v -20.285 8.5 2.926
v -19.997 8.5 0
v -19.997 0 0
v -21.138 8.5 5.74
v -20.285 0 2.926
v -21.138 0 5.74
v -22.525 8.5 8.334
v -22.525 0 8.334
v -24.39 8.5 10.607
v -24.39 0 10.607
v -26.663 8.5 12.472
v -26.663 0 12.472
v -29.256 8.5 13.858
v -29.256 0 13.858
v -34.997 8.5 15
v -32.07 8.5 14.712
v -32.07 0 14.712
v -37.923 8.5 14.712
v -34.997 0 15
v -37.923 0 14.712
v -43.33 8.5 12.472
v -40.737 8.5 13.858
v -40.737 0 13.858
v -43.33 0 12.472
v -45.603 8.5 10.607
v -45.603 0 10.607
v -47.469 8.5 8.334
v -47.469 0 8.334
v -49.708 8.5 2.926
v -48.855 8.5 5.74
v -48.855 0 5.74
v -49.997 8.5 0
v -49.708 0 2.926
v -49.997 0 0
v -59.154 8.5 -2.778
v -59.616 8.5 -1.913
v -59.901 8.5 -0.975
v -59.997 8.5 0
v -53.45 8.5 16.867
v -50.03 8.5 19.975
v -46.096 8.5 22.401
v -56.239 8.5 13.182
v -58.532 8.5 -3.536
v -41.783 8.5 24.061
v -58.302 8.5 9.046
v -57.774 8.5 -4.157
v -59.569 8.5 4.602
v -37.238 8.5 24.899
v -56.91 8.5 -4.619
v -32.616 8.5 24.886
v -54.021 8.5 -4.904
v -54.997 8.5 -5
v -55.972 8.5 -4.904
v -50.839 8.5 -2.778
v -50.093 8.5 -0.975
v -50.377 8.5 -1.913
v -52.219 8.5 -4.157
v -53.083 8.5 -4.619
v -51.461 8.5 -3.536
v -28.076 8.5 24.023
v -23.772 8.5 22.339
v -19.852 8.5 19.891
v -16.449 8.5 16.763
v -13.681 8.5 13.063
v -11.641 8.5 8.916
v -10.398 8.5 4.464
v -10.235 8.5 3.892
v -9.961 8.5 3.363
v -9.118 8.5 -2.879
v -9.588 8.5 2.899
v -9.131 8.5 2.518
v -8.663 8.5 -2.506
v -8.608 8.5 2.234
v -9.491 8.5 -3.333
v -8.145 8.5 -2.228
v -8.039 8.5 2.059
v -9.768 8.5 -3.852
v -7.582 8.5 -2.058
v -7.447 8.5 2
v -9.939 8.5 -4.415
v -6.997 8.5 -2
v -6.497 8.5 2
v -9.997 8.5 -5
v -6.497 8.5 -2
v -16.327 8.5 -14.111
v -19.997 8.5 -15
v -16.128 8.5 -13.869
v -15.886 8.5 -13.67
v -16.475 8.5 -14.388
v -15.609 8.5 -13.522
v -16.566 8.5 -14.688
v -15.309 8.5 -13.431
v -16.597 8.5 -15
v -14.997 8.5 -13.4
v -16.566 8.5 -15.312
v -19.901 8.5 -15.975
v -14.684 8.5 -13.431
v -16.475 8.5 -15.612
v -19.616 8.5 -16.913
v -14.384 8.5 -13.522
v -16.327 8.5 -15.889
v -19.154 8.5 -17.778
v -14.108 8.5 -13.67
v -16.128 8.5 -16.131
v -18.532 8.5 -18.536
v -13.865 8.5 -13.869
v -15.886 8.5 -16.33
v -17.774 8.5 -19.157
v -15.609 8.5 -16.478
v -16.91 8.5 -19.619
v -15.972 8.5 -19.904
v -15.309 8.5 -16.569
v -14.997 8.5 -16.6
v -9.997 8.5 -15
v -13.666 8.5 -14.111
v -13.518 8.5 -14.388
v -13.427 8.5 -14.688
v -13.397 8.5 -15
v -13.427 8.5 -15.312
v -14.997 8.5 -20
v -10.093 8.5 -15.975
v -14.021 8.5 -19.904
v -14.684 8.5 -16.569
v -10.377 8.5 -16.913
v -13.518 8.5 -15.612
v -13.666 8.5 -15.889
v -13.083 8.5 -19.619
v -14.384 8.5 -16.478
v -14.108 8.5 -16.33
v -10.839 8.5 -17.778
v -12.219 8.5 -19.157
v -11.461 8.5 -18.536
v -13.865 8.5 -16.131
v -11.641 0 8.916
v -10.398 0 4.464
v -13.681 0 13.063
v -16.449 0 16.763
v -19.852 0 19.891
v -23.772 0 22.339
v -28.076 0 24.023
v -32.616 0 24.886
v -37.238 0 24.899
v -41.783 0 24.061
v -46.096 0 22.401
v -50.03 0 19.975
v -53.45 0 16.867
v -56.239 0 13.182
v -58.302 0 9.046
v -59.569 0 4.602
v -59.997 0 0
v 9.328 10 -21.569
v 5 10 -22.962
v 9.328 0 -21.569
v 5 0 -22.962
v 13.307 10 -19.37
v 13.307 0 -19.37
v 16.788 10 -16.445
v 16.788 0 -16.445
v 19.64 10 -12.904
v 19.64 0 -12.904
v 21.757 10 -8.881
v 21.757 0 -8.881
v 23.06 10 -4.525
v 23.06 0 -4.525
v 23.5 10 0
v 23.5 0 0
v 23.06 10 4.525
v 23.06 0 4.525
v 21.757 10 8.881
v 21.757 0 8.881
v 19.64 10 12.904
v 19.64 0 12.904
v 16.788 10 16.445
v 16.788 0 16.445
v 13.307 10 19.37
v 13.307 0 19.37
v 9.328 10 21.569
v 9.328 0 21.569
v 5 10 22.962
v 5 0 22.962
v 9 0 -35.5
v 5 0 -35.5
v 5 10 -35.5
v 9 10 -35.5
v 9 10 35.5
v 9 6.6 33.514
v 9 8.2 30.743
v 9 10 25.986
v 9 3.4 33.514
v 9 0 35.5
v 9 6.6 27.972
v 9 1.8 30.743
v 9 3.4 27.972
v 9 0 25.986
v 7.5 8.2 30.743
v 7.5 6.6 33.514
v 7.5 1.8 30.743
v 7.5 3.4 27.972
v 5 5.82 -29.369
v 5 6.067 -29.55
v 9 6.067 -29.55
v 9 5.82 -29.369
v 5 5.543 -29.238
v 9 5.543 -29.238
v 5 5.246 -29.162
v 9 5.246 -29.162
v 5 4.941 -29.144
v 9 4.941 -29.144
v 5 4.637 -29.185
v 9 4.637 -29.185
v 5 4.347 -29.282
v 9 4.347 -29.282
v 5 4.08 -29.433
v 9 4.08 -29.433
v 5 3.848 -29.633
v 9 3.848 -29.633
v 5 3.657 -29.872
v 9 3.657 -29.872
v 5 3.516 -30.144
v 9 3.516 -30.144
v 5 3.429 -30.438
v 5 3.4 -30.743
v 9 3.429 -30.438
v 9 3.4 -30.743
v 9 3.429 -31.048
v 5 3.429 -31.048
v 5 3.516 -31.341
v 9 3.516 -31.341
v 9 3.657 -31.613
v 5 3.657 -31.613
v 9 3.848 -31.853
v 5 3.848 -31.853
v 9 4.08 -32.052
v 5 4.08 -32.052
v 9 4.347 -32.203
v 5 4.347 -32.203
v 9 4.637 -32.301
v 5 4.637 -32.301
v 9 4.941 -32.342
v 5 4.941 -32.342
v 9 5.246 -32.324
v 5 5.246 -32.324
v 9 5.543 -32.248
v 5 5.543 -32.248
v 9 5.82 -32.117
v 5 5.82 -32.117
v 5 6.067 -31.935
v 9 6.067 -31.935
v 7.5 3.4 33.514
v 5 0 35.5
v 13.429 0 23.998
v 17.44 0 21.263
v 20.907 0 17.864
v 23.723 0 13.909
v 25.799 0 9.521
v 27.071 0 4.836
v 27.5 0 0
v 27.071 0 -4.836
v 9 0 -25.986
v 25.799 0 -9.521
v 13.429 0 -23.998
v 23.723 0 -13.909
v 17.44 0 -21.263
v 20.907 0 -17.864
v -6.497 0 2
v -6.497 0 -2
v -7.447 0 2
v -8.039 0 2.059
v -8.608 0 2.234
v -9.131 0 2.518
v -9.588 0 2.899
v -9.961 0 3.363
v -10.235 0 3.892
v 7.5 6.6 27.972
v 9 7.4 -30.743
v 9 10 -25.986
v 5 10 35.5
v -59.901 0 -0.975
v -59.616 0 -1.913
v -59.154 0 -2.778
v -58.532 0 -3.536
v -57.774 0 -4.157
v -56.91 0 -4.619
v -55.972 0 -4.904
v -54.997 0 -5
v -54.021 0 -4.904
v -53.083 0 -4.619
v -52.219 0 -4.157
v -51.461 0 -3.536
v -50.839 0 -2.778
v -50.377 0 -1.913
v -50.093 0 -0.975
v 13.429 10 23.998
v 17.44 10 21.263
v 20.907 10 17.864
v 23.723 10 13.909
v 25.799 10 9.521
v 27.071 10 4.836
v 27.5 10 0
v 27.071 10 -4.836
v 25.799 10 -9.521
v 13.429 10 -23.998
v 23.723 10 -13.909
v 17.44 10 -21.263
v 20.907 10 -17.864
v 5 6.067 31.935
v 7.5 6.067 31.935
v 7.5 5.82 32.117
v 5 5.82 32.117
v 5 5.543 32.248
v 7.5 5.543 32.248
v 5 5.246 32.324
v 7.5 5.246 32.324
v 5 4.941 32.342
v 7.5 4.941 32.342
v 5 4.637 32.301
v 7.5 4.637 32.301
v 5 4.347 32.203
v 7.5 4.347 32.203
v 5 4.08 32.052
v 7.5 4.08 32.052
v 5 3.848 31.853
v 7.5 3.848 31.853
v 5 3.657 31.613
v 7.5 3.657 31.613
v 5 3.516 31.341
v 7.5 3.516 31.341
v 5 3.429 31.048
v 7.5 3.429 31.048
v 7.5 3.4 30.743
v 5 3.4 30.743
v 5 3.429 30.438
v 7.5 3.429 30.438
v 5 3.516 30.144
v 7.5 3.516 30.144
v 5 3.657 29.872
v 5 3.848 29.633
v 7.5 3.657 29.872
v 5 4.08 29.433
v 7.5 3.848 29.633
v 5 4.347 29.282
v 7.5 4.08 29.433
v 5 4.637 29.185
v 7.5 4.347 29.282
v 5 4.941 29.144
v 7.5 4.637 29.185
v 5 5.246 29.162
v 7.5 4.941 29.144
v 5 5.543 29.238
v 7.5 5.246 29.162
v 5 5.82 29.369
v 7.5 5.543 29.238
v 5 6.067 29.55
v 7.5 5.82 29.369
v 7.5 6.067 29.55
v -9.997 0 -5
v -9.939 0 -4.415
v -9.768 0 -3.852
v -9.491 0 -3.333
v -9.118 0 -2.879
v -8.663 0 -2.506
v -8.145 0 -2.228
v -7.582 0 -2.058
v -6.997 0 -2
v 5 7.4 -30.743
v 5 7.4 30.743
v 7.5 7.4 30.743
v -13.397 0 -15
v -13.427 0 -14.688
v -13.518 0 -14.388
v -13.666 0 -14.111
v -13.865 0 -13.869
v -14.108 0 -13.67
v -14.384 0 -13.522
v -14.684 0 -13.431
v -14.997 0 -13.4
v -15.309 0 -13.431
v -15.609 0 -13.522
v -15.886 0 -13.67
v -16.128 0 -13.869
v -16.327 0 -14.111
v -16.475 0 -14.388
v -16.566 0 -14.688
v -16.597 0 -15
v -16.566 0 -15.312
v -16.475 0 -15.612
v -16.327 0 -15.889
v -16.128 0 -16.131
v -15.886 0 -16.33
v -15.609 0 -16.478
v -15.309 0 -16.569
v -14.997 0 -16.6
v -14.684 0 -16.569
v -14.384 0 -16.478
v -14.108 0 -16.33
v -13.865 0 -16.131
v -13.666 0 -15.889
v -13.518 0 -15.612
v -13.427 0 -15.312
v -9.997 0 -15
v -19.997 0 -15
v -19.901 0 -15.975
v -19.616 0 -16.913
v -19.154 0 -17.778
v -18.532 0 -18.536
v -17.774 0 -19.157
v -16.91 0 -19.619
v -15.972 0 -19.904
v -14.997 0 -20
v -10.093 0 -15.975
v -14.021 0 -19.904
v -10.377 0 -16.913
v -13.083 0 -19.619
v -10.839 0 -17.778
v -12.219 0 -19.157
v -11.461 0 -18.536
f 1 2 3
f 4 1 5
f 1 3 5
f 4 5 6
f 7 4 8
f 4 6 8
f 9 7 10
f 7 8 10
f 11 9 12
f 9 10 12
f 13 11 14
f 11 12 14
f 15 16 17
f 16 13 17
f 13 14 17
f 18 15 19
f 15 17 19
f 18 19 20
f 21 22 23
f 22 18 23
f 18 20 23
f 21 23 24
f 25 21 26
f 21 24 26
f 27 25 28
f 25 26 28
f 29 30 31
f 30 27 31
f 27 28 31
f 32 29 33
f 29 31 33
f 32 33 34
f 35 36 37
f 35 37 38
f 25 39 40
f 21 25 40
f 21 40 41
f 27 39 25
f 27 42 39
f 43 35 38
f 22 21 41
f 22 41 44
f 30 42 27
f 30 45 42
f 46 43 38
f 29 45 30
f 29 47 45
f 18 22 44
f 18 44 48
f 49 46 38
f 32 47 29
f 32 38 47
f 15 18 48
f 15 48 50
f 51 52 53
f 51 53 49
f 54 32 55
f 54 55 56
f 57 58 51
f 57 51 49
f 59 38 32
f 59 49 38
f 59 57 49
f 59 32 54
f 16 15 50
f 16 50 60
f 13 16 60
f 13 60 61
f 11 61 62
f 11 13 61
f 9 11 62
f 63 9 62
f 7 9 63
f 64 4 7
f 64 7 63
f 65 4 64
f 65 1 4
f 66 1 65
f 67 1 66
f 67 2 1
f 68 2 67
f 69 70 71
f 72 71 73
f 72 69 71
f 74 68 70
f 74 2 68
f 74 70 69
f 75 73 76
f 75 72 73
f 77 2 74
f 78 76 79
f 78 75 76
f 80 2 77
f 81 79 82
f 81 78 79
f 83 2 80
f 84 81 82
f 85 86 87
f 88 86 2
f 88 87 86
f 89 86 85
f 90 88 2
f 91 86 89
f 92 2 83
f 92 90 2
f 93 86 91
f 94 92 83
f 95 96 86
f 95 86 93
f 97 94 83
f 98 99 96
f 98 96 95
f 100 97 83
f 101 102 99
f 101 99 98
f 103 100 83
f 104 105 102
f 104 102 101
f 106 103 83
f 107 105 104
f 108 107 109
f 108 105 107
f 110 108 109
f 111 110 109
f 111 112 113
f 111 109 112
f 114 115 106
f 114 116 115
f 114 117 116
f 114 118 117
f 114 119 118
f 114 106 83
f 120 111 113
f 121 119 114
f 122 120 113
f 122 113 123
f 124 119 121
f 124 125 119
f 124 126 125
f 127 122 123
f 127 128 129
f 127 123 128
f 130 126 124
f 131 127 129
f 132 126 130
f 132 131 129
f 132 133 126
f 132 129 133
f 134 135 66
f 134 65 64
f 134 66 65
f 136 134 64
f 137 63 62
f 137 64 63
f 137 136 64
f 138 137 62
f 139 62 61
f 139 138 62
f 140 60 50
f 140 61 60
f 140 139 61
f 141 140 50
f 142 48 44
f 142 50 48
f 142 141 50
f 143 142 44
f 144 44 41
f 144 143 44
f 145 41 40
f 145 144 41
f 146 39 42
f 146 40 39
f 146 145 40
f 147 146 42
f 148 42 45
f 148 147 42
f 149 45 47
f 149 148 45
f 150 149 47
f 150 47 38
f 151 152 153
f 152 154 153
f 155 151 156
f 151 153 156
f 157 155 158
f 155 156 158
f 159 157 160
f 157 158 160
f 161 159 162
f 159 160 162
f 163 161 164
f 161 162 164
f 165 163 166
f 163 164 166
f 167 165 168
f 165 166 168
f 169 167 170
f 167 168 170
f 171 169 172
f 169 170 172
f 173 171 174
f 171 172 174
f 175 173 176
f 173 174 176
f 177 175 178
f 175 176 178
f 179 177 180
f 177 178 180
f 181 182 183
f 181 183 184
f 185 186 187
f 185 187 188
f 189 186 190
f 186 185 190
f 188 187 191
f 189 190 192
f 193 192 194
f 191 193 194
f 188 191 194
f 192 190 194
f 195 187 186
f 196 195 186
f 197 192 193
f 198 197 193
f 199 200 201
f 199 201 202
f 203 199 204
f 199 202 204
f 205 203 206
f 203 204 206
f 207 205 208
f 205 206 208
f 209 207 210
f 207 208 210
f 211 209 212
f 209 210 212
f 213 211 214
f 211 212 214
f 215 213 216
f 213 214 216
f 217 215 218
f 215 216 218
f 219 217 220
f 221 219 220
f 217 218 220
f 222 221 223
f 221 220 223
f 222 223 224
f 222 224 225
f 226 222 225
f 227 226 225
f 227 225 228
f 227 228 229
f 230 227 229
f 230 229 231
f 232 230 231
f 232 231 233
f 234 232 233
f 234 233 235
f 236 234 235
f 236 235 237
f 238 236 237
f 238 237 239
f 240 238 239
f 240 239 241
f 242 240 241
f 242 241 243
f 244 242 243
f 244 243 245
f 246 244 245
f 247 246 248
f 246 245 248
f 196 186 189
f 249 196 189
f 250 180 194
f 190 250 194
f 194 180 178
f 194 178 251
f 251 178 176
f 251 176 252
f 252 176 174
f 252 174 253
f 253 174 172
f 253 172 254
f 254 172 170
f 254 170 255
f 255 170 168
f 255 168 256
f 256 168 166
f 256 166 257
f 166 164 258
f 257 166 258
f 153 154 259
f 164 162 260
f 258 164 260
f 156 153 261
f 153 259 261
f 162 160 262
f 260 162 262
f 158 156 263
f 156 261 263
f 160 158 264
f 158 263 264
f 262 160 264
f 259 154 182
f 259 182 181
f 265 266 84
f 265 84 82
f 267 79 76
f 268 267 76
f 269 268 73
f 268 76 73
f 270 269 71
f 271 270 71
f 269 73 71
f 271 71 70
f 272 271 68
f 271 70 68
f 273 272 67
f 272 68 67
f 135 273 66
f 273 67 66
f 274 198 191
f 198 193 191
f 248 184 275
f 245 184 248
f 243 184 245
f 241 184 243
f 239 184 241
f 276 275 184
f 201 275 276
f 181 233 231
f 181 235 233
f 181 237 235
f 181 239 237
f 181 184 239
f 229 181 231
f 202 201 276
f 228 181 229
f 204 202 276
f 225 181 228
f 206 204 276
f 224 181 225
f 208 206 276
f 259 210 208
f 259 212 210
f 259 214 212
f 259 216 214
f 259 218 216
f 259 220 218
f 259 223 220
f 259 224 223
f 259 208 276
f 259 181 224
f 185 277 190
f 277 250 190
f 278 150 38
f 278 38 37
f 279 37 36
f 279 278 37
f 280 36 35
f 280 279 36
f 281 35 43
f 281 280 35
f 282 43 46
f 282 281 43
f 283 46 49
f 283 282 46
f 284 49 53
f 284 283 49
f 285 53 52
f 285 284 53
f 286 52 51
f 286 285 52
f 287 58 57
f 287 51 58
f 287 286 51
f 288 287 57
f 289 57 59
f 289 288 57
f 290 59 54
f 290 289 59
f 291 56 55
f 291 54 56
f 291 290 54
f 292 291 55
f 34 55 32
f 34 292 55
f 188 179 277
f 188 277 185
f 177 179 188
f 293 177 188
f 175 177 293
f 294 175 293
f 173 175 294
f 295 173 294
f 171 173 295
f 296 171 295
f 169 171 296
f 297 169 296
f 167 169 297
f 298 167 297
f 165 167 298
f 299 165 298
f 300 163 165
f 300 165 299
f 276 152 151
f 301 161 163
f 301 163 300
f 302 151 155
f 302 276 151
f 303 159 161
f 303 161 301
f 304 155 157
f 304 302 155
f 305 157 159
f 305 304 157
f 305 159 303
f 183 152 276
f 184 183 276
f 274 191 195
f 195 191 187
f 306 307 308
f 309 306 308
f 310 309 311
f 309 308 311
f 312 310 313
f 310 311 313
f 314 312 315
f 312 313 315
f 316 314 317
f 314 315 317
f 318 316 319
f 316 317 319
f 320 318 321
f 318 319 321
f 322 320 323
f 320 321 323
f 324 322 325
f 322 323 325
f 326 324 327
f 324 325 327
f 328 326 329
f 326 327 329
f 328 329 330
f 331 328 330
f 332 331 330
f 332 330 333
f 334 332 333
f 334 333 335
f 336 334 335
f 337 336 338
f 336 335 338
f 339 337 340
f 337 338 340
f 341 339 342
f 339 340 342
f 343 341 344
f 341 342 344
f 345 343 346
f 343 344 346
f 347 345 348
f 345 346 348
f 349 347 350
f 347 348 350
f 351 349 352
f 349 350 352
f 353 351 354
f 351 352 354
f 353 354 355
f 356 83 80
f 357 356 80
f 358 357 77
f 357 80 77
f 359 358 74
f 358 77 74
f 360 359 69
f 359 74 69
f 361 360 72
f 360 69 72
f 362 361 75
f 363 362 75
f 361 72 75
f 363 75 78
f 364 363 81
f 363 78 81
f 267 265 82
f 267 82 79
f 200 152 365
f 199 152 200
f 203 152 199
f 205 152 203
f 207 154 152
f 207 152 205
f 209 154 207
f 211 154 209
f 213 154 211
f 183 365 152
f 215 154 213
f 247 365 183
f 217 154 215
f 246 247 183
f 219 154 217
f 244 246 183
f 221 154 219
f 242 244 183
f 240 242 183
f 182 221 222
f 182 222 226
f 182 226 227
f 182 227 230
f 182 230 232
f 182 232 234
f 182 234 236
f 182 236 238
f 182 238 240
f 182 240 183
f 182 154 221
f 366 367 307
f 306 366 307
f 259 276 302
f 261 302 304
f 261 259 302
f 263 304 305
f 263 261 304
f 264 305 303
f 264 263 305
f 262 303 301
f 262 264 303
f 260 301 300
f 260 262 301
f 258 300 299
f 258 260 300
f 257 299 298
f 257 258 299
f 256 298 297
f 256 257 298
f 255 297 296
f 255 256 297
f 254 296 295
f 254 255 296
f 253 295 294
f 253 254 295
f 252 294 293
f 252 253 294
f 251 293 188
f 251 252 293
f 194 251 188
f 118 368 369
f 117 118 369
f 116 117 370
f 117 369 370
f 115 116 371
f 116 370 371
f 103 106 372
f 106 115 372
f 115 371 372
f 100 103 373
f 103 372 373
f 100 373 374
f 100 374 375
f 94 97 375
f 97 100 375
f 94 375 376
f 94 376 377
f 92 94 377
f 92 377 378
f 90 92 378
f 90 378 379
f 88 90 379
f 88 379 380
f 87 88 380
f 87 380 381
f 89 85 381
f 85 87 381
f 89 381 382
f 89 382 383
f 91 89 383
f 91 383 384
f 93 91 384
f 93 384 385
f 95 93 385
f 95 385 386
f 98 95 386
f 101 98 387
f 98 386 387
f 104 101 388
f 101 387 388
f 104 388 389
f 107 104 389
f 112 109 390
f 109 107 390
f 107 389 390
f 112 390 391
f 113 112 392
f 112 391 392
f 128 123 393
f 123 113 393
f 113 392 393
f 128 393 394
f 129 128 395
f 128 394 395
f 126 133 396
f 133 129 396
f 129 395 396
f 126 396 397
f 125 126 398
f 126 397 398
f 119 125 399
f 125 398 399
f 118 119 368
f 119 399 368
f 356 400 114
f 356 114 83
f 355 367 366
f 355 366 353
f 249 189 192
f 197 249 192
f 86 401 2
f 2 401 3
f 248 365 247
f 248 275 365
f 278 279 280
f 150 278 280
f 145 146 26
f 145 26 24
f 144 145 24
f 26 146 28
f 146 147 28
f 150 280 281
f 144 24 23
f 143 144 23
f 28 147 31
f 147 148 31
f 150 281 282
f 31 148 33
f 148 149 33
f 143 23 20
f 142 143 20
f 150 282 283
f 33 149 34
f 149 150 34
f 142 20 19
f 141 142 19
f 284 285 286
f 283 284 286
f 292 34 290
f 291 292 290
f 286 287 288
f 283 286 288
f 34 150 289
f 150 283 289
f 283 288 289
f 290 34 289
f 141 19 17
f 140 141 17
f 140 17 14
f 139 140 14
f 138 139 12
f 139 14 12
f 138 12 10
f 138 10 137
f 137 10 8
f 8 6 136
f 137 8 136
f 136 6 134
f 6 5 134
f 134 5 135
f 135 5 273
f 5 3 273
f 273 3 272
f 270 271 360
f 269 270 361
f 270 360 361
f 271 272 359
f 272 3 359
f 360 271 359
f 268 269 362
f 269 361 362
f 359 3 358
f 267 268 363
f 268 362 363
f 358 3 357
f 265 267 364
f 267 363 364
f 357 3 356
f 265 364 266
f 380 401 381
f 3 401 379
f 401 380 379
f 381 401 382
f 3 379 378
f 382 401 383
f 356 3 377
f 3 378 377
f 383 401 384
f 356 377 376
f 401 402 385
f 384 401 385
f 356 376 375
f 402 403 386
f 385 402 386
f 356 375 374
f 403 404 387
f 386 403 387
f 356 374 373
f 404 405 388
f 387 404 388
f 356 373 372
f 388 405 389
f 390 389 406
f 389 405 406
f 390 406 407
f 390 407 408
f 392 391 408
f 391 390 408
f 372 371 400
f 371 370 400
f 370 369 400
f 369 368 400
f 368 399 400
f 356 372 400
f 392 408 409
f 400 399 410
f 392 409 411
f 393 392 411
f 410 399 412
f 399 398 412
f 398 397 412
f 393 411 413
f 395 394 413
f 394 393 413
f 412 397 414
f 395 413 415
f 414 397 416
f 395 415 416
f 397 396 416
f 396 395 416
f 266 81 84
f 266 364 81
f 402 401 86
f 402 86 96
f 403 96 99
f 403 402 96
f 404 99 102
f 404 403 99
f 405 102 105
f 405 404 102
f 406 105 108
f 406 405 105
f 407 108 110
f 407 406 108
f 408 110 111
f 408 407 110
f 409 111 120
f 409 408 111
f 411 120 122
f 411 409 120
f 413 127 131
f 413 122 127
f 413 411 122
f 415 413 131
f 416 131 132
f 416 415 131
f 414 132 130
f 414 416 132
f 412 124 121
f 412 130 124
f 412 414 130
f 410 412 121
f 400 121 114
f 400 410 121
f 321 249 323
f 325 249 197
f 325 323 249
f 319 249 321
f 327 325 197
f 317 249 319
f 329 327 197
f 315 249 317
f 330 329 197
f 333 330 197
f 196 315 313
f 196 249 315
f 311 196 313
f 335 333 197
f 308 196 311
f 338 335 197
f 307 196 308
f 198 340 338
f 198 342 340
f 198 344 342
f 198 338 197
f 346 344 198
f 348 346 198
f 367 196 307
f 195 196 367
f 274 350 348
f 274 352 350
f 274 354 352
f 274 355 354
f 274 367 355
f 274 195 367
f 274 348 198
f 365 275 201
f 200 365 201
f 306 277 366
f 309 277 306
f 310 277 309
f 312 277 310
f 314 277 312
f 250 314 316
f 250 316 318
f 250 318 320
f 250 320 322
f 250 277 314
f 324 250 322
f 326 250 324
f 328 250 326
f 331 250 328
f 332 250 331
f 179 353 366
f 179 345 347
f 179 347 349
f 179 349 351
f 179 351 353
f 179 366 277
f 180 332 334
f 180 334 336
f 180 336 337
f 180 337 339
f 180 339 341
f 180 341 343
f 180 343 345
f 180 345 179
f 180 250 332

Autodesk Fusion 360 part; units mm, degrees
sketch "Sketch1" plane through (0, 0, 0) normal (0, 1, 0) x (1, 0, 0) in component "Component"
  circle A0 centre (0, 0) radius 23.5
  circle A1 centre (0, 0) radius 27.5
  line L0 (-5, 35.5) -> (-9, 35.5)
  line L1 (-9, 35.5) -> (-9, 23.5)
  line L2 (-9, 23.5) -> (-5, 23.5)
  line L3 (-5, 23.5) -> (-5, 35.5)
  line L4 (0, 5) -> (0, -5)
  line L5 (-5, 0) -> (5, 0)
  line L6 (9, 35.5) -> (9, 23.5)
  line L7 (5, 23.5) -> (5, 35.5)
  line L8 (9, 23.5) -> (5, 23.5)
  line L9 (5, 35.5) -> (9, 35.5)
  line L10 (-9, -35.5) -> (-9, -23.5)
  line L11 (-5, -23.5) -> (-5, -35.5)
  line L12 (5, -23.5) -> (5, -35.5)
  line L13 (9, -35.5) -> (9, -23.5)
  line L14 (5, -35.5) -> (9, -35.5)
  line L15 (9, -23.5) -> (5, -23.5)
  line L16 (-9, -23.5) -> (-5, -23.5)
  line L17 (-5, -35.5) -> (-9, -35.5)
  line L18 (-5, 23.5) -> (-5, -23.5)
  line L19 (5, -23.5) -> (5, 23.5)
  dimension "d2" = 47
  dimension "d4" = 55
  dimension "d7" = 4
  dimension "d54" = 12
extrude "Extrude1" add sketch "Sketch1" along normal blind 10 contours A0 A1 L6 L8 L13 L15 L19 | A1 L6 L7 L8 | A1 L12 L13 L15 | A1 L6 L7 L9 | A1 L12 L13 L14 makes body 1 in component "Component"
sketch "Sketch6" plane through (9, 0, 0) normal (1, 0, 0) x (0, 0, -1)
  line L0 (-35.5, 0) -> (-25.9856, 0)
  line L1 (-25.9856, 0) -> (-25.9856, 10)
  line L2 (-25.9856, 10) -> (-35.5, 10)
  line L3 (-35.5, 10) -> (-35.5, 0)
  line L4 (-35.5, 5) -> (-25.9856, 5)
  circle A0 centre (-30.7428, 5) radius 1.6
  line L5 (-30.7428, 8.2) -> (-33.5141, 6.6)
  line L6 (-33.5141, 6.6) -> (-33.5141, 3.4)
  line L7 (-33.5141, 3.4) -> (-30.7428, 1.8)
  line L8 (-30.7428, 1.8) -> (-27.9715, 3.4)
  line L9 (-27.9715, 3.4) -> (-27.9715, 6.6)
  line L10 (-27.9715, 6.6) -> (-30.7428, 8.2)
  line L11 (-30.7428, 7.4) -> (-31.9354, 6.0667)
  line L12 (-30.7428, 7.4) -> (-29.5502, 6.0667)
  point P0 (-30.7428, 5)
  dimension "d72" = 3.2
  dimension "d78" = 2.4
sketch "Sketch7" plane through (9, 0, 0) normal (1, 0, 0) x (0, 0, -1)
  line L0 (25.9856, 0) -> (35.5, 0)
  line L1 (35.5, 0) -> (35.5, 10)
  line L2 (35.5, 10) -> (25.9856, 10)
  line L3 (25.9856, 10) -> (25.9856, 0)
  line L4 (25.9856, 5) -> (35.5, 5)
  circle A0 centre (30.7428, 5) radius 1.6
  line L5 (30.7428, 5) -> (30.7428, 7.4)
  line L6 (30.7428, 7.4) -> (29.5502, 6.0667)
  line L7 (30.7428, 7.4) -> (31.9354, 6.0667)
  dimension "d73" = 3.2
  dimension "d79" = 2.4
extrude "Extrude5" cut sketch "Sketch6" against normal up to surface (4 mm away) contours L4 A0 | L4 A0 | A0 L11 L12 bodies 1 in component "Component"
extrude "Extrude6" cut sketch "Sketch7" against normal up to surface (4 mm away) contours L4 A0 L5 | L4 A0 | L4 A0 L5 | A0 L5 L6 | A0 L5 L7 bodies 1 in component "Component"
extrude "Extrude7" cut sketch "Sketch6" against normal blind 1.5 contours L4 A0 L5 L6 L9 L10 L11 L12 | L4 A0 L6 L7 L8 L9 | A0 L11 L12 bodies 1 in component "Component"
sketch "Sketch5" plane through (0, 0, 0) normal (0, 1, 0) x (1, 0, 0)
  circle A0 centre (-14.9966, 15) radius 5
  line L0 (-19.9966, 15) -> (-19.9966, 0)
  line L1 (-9.9966, 15) -> (-9.9966, 0)
  circle A1 centre (-14.9966, 15) radius 1.6
  line L2 (-14.9966, 2) -> (-6.4966, 2)
  line L3 (-6.4966, 2) -> (-6.4966, -2)
  line L4 (-6.4966, -2) -> (-14.9966, -2)
  line L5 (-14.9966, -2) -> (-14.9966, 2)
  line L6 (-19.9966, 0) -> (-9.9966, 0)
  arc A2 (-49.9966, 0) -> (-19.9966, 0) centre (-34.9966, 0) ccw
  line L7 (-34.9966, 0) -> (-49.9966, 0) construction
  line L8 (-34.9966, 0) -> (-19.9966, 0) construction
  arc A3 (-59.9966, 0) -> (-9.9966, 0) centre (-34.9966, 0) ccw
  line L9 (-34.9966, 0) -> (-59.9966, 0) construction
  line L10 (-34.9966, 0) -> (-9.9966, 0) construction
  line L11 (-49.9966, 0) -> (-59.9966, 0)
  arc A4 (-49.9966, 0) -> (-59.9966, 0) centre (-54.9966, 0) ccw
  dimension "d64" = 10
  dimension "d65" = 8
  dimension "d67" = 3.2
  dimension "d68" = 8.5
  dimension "d74" = 180
  dimension "d75" = 15
  dimension "d76" = 180
extrude "Extrude2" add sketch "Sketch5" along normal blind 8.5 separate body makes body 2
fillet "Fillet5" radius 3 2 edges at (-10.0767, 4.25, 2) (-9.9966, 4.25, -2) on bodies 2
component "Component" placed x (1, 0, 0) y (0, 1, 0) z (0, 0, 1) at (0, 0, 0)
equation "ikeaStolmanPoleDiameter = 47 mm"
equation "d2 = ikeaStolmanPoleDiameter"
equation "thickness = 4 mm"
equation "d4 = ikeaStolmanPoleDiameter + thickness + thickness"
equation "d7 = thickness"
equation "d11 = height"
equation "flexThickness = 0.75 mm"
equation "height = 10 mm"
equation "d64 = height"
